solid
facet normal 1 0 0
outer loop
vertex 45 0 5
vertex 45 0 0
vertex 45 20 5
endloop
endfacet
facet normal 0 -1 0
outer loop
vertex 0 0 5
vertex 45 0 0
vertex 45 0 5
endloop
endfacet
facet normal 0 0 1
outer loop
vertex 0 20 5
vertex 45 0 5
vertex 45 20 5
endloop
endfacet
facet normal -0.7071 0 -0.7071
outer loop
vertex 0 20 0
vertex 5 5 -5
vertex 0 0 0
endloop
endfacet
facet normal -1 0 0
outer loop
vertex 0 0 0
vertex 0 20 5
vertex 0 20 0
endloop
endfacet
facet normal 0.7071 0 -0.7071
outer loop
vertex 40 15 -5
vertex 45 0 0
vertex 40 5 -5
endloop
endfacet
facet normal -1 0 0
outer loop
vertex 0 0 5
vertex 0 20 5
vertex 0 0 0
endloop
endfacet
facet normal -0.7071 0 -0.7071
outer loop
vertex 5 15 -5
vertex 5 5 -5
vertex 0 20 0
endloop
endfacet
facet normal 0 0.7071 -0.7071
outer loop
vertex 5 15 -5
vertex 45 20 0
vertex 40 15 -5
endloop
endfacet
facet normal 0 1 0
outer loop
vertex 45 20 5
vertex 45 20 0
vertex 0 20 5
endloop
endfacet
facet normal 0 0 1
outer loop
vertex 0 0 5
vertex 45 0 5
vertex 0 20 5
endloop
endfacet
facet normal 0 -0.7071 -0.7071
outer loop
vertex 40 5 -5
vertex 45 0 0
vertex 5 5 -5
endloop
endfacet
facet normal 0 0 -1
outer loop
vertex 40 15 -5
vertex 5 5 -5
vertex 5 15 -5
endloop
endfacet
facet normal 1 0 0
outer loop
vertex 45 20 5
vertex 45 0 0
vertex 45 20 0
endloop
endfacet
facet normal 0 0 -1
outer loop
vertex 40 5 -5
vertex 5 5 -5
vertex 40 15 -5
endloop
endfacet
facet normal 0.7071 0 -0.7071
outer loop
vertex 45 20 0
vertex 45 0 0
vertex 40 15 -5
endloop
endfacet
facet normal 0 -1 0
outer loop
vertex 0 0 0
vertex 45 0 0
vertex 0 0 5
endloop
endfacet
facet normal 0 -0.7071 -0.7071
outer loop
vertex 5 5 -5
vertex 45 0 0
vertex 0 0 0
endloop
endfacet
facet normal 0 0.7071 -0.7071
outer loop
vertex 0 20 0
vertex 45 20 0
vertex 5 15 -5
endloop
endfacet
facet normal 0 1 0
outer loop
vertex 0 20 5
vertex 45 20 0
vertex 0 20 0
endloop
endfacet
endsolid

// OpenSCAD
/* [General Parameters] */
bevelSize=5;
bevelVector=[45,20];
zeroVector=[0,0,0];

bevelSolid(bevelSize,bevelVector);


module bevelSolid(bevelSize,bevelVector)
{
    hull() // Put corner elements at the four corners of the bevel solid
    {
	translate([bevelSize,bevelSize,0])
	{
	    bevelCorner(bevelSize);
	}
	translate([bevelVector[0]-bevelSize,bevelSize,0])
	{
	    bevelCorner(bevelSize);
	}
	translate([bevelVector[0]-bevelSize,bevelVector[1]-bevelSize,0])
	{
	    bevelCorner(bevelSize);
	}
	translate([bevelSize,bevelVector[1]-bevelSize,0])
	{
	    bevelCorner(bevelSize);
	}
    }
}



module bevelCorner(bevelSize)
{
    intersection()
    {
	rotate([90,0,0])
	{
	    bevelCornerElement(bevelSize);
	}

	rotate([90,0,90])
	{
	    bevelCornerElement(bevelSize);
	}
    }
}

module bevelCornerElement(bevelSize)
{
    linear_extrude(height=2*bevelSize,center=true)
    {
	polygon(points=[[bevelSize,0],[bevelSize,bevelSize],[-bevelSize,bevelSize],[-bevelSize,0],[0,-bevelSize]]);
    }
}
